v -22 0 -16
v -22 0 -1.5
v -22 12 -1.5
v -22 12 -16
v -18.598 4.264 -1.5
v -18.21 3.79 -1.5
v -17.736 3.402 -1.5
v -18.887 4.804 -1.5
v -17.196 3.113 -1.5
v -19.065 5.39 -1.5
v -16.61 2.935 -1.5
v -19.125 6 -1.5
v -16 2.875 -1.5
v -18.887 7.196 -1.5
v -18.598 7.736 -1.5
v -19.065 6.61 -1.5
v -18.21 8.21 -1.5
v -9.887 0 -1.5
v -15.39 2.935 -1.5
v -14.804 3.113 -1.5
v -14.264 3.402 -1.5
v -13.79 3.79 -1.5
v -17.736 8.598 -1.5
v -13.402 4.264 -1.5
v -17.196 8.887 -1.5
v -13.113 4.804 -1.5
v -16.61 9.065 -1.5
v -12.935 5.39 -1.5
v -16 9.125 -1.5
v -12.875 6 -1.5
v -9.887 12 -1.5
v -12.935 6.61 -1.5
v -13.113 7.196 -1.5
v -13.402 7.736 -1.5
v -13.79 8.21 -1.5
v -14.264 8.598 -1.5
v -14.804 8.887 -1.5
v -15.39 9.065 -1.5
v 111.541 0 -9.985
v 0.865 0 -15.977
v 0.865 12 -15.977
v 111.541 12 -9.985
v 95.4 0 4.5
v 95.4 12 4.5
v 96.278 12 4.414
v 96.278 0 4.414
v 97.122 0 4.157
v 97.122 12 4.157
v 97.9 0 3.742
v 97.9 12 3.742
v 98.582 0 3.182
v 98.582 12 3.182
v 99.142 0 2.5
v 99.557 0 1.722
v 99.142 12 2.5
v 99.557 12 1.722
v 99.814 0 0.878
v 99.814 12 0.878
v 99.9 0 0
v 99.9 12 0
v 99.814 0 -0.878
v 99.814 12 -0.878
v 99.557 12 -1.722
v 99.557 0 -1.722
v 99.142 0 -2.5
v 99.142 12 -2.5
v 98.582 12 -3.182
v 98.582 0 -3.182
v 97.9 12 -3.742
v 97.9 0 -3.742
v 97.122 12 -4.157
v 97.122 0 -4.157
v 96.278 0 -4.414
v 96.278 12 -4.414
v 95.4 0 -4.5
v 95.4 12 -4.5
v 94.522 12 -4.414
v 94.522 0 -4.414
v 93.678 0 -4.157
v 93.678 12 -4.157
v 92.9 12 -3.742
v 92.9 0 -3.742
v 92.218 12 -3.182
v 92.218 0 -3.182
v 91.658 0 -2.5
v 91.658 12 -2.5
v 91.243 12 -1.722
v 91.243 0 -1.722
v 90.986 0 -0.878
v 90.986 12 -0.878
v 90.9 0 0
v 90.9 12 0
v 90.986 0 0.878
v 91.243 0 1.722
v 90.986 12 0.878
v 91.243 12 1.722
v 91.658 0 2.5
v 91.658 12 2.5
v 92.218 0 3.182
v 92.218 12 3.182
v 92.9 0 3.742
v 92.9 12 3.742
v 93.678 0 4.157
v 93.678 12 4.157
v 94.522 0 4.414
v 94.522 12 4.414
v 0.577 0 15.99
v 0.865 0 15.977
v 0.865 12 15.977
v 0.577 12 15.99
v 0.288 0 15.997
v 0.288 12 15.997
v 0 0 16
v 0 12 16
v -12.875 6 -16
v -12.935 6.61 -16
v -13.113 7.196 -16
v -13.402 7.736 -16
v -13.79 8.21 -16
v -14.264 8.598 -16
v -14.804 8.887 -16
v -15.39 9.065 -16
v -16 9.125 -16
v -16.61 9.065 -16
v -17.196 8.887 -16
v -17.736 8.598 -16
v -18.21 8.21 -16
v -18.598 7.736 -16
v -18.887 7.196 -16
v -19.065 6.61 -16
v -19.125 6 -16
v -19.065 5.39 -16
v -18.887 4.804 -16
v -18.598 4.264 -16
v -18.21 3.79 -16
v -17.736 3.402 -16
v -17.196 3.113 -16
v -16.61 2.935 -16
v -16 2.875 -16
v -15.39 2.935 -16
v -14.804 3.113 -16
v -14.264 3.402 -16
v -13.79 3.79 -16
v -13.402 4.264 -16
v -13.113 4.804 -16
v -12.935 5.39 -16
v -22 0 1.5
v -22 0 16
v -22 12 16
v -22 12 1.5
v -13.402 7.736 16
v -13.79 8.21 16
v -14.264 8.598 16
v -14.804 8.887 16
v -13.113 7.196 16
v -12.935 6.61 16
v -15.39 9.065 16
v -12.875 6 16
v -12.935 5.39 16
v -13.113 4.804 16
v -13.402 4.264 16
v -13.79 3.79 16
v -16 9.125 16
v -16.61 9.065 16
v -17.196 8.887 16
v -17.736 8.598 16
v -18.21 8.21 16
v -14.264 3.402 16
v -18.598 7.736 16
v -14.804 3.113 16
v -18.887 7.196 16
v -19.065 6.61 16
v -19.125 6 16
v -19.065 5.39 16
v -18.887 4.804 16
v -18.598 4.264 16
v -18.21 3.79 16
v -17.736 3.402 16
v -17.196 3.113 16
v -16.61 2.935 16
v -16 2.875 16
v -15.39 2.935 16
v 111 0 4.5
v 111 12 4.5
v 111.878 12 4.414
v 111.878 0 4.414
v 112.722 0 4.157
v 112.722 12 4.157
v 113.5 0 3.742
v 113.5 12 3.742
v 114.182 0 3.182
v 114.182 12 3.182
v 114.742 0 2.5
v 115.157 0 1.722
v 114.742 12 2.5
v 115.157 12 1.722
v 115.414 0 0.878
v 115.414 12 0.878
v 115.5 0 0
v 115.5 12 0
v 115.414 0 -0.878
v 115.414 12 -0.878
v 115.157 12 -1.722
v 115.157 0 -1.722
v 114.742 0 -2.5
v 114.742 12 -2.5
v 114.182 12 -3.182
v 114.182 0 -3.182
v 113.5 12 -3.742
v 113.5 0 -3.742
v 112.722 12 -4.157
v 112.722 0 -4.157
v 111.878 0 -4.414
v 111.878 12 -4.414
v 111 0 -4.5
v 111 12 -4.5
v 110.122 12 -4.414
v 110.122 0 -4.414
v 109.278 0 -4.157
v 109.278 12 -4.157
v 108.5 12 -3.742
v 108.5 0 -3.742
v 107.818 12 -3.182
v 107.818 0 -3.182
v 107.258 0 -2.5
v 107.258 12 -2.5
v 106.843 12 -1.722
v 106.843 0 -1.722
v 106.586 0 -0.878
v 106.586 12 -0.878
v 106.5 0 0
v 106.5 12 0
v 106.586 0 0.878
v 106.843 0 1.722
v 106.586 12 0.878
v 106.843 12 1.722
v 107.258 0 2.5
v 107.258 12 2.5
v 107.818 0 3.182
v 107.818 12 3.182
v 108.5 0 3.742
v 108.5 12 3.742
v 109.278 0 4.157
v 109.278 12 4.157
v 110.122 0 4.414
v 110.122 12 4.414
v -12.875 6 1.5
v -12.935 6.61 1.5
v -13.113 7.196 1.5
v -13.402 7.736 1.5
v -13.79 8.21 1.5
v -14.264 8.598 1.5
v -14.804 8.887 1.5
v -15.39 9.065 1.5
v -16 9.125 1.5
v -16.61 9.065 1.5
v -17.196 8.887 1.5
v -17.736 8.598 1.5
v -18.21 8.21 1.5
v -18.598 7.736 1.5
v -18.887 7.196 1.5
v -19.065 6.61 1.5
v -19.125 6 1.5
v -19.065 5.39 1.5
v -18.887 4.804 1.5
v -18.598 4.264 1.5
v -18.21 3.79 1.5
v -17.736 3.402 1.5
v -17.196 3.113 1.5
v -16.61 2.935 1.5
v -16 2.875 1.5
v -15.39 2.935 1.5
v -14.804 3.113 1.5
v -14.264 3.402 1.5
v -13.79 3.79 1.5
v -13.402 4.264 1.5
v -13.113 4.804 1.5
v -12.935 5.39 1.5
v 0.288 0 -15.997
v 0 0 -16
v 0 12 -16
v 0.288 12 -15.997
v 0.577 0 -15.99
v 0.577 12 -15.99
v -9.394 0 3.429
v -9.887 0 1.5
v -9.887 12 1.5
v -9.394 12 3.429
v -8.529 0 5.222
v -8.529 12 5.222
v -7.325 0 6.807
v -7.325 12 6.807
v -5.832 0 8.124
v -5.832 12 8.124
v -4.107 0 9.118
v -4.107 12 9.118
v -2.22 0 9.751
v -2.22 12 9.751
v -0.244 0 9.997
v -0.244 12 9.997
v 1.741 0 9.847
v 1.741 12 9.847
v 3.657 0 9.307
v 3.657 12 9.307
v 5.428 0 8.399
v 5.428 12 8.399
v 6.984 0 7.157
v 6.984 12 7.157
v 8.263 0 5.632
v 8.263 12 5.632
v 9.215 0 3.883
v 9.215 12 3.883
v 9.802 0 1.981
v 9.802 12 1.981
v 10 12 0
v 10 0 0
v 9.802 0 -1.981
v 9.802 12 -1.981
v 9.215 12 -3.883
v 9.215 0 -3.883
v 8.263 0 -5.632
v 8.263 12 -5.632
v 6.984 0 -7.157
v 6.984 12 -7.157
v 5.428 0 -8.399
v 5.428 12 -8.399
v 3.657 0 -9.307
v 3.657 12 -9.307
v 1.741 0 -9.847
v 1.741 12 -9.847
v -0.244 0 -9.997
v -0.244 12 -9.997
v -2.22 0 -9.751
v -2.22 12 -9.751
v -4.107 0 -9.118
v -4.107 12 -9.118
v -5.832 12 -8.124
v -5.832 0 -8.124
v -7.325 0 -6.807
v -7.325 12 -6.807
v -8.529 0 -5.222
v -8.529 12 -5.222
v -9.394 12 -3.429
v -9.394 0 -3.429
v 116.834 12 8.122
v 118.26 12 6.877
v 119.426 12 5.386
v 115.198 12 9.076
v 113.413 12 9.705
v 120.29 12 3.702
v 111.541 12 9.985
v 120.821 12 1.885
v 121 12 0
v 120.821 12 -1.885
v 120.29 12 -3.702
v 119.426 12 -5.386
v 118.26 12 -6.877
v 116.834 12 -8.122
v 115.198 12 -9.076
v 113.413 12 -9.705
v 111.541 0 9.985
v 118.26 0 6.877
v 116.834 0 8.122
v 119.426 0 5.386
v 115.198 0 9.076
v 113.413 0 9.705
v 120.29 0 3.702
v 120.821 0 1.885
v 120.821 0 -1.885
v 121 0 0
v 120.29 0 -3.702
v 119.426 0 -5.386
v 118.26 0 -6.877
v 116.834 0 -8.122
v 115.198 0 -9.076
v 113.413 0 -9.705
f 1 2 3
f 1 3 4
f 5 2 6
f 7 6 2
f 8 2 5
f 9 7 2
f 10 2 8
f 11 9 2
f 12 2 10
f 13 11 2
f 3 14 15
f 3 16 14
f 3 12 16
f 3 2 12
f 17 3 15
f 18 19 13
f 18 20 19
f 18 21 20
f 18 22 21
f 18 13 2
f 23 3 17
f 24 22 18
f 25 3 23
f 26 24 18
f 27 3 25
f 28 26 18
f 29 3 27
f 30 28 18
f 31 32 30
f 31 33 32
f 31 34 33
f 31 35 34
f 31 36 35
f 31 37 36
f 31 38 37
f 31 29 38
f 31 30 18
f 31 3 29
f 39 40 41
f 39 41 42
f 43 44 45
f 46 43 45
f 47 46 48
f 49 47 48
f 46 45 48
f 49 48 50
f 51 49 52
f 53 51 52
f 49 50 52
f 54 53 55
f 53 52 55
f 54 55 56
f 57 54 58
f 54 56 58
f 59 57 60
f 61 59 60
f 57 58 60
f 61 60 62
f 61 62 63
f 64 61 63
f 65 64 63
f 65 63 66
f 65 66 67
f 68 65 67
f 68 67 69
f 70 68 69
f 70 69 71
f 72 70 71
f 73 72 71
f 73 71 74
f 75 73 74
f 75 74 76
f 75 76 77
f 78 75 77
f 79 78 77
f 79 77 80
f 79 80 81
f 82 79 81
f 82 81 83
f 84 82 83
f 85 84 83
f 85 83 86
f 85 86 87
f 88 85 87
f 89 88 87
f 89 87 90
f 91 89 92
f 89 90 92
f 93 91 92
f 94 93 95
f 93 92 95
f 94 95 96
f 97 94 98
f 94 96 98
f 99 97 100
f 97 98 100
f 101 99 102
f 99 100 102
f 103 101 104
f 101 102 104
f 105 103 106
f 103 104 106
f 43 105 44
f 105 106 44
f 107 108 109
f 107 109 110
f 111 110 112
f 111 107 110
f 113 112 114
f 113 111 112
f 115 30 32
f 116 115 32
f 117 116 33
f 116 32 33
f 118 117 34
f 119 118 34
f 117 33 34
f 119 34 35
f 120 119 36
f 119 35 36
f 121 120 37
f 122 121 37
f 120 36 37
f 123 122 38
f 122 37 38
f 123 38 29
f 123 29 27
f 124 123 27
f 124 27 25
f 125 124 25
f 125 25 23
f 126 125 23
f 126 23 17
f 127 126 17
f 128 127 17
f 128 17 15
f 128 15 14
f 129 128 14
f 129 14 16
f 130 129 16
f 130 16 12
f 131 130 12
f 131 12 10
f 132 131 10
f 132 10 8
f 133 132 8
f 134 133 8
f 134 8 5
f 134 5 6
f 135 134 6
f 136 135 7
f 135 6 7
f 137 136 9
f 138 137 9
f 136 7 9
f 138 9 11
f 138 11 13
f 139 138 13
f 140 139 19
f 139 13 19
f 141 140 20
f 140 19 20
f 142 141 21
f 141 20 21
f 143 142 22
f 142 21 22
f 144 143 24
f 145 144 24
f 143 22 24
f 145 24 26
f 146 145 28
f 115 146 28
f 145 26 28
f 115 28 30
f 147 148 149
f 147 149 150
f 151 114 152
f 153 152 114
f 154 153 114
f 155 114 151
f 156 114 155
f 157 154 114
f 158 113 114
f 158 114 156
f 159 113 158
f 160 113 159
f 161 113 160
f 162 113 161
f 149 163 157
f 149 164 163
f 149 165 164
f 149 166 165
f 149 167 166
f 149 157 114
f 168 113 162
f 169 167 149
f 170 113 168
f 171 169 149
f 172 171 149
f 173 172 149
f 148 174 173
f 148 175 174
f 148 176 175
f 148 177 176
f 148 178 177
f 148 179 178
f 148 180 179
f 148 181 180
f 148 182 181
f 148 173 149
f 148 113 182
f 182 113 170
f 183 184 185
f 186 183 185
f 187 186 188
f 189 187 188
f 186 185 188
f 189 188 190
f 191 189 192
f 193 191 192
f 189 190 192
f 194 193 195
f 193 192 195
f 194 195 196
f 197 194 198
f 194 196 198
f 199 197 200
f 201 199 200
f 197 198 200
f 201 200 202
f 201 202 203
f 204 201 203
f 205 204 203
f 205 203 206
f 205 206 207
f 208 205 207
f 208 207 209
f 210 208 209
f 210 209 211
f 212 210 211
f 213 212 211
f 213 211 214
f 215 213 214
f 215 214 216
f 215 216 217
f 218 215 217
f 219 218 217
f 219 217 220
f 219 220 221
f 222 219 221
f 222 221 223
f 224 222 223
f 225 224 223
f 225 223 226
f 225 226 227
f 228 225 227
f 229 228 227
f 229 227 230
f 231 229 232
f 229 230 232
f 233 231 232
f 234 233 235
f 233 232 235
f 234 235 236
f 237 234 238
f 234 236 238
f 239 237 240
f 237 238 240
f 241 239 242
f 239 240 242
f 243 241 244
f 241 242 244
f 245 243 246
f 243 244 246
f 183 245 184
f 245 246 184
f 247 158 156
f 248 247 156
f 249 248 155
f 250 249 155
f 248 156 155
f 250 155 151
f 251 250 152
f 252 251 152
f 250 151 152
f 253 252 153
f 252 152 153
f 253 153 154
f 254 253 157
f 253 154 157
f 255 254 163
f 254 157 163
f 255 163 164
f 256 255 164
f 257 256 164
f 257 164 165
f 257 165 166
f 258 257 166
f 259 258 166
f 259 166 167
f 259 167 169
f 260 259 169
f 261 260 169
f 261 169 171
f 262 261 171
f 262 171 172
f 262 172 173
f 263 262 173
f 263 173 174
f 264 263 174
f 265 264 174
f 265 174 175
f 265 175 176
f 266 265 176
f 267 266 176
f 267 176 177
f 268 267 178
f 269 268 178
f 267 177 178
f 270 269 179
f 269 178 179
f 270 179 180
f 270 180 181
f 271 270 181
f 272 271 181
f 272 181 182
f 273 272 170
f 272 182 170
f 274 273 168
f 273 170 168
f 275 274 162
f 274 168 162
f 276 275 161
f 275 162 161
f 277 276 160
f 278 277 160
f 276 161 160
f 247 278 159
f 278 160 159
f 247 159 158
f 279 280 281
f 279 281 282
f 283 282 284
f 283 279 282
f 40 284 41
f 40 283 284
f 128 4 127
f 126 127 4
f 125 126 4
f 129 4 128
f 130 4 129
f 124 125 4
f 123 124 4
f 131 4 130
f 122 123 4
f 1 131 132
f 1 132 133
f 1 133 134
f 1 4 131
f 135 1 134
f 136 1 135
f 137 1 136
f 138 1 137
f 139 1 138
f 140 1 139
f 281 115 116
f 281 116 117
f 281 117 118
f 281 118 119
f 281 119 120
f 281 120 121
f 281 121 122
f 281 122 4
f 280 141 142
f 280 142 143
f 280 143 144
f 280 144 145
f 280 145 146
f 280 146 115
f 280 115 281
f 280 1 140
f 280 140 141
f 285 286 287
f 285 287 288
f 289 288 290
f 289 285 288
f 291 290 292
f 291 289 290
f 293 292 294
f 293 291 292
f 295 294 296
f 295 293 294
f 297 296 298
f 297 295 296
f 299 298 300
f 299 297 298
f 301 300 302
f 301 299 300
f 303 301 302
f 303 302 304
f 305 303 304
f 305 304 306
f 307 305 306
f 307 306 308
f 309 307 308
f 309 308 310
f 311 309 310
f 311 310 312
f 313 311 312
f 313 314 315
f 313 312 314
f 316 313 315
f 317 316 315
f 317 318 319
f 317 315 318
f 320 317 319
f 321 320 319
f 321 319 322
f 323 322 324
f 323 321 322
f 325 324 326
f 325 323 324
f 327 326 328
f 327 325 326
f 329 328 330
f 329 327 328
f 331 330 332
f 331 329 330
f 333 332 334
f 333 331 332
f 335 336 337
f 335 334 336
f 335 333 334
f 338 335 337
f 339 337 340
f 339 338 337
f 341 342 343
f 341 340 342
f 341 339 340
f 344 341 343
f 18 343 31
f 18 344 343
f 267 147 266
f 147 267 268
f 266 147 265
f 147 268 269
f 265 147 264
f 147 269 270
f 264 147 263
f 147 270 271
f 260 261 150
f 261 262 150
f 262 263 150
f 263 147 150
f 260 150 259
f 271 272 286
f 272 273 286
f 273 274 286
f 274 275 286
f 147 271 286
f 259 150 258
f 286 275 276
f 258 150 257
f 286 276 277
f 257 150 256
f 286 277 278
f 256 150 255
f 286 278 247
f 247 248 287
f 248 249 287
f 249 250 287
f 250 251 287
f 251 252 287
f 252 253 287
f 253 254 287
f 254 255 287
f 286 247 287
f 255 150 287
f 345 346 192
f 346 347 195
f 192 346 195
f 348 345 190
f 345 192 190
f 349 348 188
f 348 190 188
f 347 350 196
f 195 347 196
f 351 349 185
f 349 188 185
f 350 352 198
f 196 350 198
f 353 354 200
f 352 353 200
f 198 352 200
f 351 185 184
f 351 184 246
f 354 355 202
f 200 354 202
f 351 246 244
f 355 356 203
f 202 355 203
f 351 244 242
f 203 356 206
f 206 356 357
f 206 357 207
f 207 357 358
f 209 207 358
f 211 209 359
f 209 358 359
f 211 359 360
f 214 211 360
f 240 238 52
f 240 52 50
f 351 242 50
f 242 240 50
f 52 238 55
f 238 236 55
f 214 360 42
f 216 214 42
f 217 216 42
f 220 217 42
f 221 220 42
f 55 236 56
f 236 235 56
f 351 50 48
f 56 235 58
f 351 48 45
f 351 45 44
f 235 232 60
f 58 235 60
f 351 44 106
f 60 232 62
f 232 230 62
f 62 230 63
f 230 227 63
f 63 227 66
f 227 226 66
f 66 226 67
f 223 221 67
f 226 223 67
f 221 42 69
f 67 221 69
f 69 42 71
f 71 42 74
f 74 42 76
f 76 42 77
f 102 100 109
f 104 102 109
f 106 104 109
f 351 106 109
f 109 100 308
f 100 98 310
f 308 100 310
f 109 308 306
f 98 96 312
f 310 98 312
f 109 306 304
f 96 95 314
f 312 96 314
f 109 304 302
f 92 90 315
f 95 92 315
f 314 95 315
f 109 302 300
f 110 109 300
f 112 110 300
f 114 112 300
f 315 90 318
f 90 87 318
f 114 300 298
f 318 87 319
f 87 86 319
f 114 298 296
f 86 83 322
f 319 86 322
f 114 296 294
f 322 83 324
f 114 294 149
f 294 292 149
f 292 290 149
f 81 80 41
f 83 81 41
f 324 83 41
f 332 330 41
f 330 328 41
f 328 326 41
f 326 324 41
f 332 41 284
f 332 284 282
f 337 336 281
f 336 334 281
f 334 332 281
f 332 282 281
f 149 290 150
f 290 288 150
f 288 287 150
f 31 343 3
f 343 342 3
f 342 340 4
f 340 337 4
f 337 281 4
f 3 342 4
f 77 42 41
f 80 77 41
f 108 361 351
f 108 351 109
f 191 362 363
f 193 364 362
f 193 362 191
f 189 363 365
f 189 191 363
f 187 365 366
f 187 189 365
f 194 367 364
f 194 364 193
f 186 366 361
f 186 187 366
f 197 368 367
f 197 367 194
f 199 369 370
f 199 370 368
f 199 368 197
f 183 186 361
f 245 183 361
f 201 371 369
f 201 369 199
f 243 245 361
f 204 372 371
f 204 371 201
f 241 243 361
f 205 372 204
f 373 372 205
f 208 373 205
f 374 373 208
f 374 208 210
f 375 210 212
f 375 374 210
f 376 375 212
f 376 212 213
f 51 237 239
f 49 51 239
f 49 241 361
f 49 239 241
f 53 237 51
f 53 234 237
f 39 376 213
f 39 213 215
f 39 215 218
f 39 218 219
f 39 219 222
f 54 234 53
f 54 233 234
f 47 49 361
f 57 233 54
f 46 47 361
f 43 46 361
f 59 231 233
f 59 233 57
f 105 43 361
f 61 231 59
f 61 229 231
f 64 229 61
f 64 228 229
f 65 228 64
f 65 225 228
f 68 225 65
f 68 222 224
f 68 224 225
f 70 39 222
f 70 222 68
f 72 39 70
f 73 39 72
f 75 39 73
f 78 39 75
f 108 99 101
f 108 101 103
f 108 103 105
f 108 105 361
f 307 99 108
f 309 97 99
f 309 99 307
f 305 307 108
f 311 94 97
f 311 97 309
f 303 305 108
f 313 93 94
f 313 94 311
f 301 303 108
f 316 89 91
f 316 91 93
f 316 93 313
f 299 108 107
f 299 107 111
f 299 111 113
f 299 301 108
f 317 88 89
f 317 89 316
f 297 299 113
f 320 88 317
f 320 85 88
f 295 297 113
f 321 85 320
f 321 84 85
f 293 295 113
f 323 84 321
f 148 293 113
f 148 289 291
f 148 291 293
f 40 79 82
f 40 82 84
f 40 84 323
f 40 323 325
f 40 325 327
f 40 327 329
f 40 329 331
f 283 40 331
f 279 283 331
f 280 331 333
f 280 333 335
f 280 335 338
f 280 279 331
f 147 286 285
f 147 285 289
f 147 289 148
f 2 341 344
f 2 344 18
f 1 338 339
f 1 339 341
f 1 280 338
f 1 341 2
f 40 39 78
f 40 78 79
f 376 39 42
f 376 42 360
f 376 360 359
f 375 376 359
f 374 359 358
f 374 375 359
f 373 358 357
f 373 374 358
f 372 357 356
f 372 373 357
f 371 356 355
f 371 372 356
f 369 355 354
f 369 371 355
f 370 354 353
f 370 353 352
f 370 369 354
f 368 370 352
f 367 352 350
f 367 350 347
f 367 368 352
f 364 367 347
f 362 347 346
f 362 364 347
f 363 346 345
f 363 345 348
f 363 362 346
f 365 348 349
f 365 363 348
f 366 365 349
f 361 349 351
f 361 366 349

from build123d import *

# Parameters (mm, degrees)
CROQUIS1_R              = 10
SALIENTE_EXTRUIR1_DEPTH = 12
CROQUIS2_W              = 21.833325304
CROQUIS2_H              = 3
CORTAR_EXTRUIR1_DEPTH   = 12
CROQUIS3_R              = 3.125
CORTAR_EXTRUIR2_DEPTH   = 126.733845881
CORTAR_EXTRUIR3_REACH   = 124.642
CROQUIS6_R              = 4.5


with BuildPart() as part:
    # Croquis1 → Saliente-Extruir1 (new body)
    with BuildSketch(Plane(origin=(0, 0, 0), x_dir=(1, 0, 0), z_dir=(0, 1, 0))):
        with BuildLine():
            Line((0.864864865, 15.976608175), (111.540540541, 9.985380109))
            ThreePointArc((111.540540541, 9.985380109), (121, 0), (111.540540541, -9.985380109))
            Line((111.540540541, -9.985380109), (0.864864865, -15.976608175))
            ThreePointArc((0.864864865, -15.976608175), (0.432590572, -15.994150975), (0, -16))
            Line((0, -16), (-22, -16))
            Line((-22, -16), (-22, 16))
            Line((-22, 16), (0, 16))
            ThreePointArc((0, 16), (0.432590572, 15.994150975), (0.864864865, 15.976608175))
        make_face()
        with Locations(Location((0, 0, 0), (0, 0, 270))):
            Circle(CROQUIS1_R, mode=Mode.SUBTRACT)
    extrude(amount=SALIENTE_EXTRUIR1_DEPTH)

    # Croquis2 → Cortar-Extruir1 (cut)
    with BuildSketch(Plane(origin=(0, 12, 0), x_dir=(1, 0, 0), z_dir=(0, 1, 0))):
        with Locations((-17.033164983, 0)):
            Rectangle(CROQUIS2_W, CROQUIS2_H)
    extrude(amount=-CORTAR_EXTRUIR1_DEPTH, mode=Mode.SUBTRACT)

    # Croquis3 → Cortar-Extruir2 (cut, through all)
    with BuildSketch(Plane.XY.offset(16)):
        with Locations((-16, 6)):
            Circle(CROQUIS3_R)
    extrude(amount=-CORTAR_EXTRUIR2_DEPTH, mode=Mode.SUBTRACT)

    # Croquis6 → Cortar-Extruir3 (cut, up to next)
    with BuildSketch(Plane(origin=(0, 12, 0), x_dir=(1, 0, 0), z_dir=(0, 1, 0)), mode=Mode.PRIVATE) as cortar_extruir3_sk1:
        with Locations(Location((111, 0, 0), (0, 0, 270))):
            Circle(CROQUIS6_R)
    cortar_extruir3_tool1 = extrude(cortar_extruir3_sk1.sketch, amount=-CORTAR_EXTRUIR3_REACH, mode=Mode.PRIVATE) & part.part
    # Croquis6 → Cortar-Extruir3 (cut, up to next)
    with BuildSketch(Plane(origin=(0, 12, 0), x_dir=(1, 0, 0), z_dir=(0, 1, 0)), mode=Mode.PRIVATE) as cortar_extruir3_sk2:
        with Locations(Location((95.4, 0, 0), (0, 0, 270))):
            Circle(CROQUIS6_R)
    cortar_extruir3_tool2 = extrude(cortar_extruir3_sk2.sketch, amount=-CORTAR_EXTRUIR3_REACH, mode=Mode.PRIVATE) & part.part
    add(cortar_extruir3_tool1.solids().sort_by_distance((111, 12, 0))[0], mode=Mode.SUBTRACT)
    add(cortar_extruir3_tool2.solids().sort_by_distance((95.4, 12, 0))[0], mode=Mode.SUBTRACT)


solid = part.part
